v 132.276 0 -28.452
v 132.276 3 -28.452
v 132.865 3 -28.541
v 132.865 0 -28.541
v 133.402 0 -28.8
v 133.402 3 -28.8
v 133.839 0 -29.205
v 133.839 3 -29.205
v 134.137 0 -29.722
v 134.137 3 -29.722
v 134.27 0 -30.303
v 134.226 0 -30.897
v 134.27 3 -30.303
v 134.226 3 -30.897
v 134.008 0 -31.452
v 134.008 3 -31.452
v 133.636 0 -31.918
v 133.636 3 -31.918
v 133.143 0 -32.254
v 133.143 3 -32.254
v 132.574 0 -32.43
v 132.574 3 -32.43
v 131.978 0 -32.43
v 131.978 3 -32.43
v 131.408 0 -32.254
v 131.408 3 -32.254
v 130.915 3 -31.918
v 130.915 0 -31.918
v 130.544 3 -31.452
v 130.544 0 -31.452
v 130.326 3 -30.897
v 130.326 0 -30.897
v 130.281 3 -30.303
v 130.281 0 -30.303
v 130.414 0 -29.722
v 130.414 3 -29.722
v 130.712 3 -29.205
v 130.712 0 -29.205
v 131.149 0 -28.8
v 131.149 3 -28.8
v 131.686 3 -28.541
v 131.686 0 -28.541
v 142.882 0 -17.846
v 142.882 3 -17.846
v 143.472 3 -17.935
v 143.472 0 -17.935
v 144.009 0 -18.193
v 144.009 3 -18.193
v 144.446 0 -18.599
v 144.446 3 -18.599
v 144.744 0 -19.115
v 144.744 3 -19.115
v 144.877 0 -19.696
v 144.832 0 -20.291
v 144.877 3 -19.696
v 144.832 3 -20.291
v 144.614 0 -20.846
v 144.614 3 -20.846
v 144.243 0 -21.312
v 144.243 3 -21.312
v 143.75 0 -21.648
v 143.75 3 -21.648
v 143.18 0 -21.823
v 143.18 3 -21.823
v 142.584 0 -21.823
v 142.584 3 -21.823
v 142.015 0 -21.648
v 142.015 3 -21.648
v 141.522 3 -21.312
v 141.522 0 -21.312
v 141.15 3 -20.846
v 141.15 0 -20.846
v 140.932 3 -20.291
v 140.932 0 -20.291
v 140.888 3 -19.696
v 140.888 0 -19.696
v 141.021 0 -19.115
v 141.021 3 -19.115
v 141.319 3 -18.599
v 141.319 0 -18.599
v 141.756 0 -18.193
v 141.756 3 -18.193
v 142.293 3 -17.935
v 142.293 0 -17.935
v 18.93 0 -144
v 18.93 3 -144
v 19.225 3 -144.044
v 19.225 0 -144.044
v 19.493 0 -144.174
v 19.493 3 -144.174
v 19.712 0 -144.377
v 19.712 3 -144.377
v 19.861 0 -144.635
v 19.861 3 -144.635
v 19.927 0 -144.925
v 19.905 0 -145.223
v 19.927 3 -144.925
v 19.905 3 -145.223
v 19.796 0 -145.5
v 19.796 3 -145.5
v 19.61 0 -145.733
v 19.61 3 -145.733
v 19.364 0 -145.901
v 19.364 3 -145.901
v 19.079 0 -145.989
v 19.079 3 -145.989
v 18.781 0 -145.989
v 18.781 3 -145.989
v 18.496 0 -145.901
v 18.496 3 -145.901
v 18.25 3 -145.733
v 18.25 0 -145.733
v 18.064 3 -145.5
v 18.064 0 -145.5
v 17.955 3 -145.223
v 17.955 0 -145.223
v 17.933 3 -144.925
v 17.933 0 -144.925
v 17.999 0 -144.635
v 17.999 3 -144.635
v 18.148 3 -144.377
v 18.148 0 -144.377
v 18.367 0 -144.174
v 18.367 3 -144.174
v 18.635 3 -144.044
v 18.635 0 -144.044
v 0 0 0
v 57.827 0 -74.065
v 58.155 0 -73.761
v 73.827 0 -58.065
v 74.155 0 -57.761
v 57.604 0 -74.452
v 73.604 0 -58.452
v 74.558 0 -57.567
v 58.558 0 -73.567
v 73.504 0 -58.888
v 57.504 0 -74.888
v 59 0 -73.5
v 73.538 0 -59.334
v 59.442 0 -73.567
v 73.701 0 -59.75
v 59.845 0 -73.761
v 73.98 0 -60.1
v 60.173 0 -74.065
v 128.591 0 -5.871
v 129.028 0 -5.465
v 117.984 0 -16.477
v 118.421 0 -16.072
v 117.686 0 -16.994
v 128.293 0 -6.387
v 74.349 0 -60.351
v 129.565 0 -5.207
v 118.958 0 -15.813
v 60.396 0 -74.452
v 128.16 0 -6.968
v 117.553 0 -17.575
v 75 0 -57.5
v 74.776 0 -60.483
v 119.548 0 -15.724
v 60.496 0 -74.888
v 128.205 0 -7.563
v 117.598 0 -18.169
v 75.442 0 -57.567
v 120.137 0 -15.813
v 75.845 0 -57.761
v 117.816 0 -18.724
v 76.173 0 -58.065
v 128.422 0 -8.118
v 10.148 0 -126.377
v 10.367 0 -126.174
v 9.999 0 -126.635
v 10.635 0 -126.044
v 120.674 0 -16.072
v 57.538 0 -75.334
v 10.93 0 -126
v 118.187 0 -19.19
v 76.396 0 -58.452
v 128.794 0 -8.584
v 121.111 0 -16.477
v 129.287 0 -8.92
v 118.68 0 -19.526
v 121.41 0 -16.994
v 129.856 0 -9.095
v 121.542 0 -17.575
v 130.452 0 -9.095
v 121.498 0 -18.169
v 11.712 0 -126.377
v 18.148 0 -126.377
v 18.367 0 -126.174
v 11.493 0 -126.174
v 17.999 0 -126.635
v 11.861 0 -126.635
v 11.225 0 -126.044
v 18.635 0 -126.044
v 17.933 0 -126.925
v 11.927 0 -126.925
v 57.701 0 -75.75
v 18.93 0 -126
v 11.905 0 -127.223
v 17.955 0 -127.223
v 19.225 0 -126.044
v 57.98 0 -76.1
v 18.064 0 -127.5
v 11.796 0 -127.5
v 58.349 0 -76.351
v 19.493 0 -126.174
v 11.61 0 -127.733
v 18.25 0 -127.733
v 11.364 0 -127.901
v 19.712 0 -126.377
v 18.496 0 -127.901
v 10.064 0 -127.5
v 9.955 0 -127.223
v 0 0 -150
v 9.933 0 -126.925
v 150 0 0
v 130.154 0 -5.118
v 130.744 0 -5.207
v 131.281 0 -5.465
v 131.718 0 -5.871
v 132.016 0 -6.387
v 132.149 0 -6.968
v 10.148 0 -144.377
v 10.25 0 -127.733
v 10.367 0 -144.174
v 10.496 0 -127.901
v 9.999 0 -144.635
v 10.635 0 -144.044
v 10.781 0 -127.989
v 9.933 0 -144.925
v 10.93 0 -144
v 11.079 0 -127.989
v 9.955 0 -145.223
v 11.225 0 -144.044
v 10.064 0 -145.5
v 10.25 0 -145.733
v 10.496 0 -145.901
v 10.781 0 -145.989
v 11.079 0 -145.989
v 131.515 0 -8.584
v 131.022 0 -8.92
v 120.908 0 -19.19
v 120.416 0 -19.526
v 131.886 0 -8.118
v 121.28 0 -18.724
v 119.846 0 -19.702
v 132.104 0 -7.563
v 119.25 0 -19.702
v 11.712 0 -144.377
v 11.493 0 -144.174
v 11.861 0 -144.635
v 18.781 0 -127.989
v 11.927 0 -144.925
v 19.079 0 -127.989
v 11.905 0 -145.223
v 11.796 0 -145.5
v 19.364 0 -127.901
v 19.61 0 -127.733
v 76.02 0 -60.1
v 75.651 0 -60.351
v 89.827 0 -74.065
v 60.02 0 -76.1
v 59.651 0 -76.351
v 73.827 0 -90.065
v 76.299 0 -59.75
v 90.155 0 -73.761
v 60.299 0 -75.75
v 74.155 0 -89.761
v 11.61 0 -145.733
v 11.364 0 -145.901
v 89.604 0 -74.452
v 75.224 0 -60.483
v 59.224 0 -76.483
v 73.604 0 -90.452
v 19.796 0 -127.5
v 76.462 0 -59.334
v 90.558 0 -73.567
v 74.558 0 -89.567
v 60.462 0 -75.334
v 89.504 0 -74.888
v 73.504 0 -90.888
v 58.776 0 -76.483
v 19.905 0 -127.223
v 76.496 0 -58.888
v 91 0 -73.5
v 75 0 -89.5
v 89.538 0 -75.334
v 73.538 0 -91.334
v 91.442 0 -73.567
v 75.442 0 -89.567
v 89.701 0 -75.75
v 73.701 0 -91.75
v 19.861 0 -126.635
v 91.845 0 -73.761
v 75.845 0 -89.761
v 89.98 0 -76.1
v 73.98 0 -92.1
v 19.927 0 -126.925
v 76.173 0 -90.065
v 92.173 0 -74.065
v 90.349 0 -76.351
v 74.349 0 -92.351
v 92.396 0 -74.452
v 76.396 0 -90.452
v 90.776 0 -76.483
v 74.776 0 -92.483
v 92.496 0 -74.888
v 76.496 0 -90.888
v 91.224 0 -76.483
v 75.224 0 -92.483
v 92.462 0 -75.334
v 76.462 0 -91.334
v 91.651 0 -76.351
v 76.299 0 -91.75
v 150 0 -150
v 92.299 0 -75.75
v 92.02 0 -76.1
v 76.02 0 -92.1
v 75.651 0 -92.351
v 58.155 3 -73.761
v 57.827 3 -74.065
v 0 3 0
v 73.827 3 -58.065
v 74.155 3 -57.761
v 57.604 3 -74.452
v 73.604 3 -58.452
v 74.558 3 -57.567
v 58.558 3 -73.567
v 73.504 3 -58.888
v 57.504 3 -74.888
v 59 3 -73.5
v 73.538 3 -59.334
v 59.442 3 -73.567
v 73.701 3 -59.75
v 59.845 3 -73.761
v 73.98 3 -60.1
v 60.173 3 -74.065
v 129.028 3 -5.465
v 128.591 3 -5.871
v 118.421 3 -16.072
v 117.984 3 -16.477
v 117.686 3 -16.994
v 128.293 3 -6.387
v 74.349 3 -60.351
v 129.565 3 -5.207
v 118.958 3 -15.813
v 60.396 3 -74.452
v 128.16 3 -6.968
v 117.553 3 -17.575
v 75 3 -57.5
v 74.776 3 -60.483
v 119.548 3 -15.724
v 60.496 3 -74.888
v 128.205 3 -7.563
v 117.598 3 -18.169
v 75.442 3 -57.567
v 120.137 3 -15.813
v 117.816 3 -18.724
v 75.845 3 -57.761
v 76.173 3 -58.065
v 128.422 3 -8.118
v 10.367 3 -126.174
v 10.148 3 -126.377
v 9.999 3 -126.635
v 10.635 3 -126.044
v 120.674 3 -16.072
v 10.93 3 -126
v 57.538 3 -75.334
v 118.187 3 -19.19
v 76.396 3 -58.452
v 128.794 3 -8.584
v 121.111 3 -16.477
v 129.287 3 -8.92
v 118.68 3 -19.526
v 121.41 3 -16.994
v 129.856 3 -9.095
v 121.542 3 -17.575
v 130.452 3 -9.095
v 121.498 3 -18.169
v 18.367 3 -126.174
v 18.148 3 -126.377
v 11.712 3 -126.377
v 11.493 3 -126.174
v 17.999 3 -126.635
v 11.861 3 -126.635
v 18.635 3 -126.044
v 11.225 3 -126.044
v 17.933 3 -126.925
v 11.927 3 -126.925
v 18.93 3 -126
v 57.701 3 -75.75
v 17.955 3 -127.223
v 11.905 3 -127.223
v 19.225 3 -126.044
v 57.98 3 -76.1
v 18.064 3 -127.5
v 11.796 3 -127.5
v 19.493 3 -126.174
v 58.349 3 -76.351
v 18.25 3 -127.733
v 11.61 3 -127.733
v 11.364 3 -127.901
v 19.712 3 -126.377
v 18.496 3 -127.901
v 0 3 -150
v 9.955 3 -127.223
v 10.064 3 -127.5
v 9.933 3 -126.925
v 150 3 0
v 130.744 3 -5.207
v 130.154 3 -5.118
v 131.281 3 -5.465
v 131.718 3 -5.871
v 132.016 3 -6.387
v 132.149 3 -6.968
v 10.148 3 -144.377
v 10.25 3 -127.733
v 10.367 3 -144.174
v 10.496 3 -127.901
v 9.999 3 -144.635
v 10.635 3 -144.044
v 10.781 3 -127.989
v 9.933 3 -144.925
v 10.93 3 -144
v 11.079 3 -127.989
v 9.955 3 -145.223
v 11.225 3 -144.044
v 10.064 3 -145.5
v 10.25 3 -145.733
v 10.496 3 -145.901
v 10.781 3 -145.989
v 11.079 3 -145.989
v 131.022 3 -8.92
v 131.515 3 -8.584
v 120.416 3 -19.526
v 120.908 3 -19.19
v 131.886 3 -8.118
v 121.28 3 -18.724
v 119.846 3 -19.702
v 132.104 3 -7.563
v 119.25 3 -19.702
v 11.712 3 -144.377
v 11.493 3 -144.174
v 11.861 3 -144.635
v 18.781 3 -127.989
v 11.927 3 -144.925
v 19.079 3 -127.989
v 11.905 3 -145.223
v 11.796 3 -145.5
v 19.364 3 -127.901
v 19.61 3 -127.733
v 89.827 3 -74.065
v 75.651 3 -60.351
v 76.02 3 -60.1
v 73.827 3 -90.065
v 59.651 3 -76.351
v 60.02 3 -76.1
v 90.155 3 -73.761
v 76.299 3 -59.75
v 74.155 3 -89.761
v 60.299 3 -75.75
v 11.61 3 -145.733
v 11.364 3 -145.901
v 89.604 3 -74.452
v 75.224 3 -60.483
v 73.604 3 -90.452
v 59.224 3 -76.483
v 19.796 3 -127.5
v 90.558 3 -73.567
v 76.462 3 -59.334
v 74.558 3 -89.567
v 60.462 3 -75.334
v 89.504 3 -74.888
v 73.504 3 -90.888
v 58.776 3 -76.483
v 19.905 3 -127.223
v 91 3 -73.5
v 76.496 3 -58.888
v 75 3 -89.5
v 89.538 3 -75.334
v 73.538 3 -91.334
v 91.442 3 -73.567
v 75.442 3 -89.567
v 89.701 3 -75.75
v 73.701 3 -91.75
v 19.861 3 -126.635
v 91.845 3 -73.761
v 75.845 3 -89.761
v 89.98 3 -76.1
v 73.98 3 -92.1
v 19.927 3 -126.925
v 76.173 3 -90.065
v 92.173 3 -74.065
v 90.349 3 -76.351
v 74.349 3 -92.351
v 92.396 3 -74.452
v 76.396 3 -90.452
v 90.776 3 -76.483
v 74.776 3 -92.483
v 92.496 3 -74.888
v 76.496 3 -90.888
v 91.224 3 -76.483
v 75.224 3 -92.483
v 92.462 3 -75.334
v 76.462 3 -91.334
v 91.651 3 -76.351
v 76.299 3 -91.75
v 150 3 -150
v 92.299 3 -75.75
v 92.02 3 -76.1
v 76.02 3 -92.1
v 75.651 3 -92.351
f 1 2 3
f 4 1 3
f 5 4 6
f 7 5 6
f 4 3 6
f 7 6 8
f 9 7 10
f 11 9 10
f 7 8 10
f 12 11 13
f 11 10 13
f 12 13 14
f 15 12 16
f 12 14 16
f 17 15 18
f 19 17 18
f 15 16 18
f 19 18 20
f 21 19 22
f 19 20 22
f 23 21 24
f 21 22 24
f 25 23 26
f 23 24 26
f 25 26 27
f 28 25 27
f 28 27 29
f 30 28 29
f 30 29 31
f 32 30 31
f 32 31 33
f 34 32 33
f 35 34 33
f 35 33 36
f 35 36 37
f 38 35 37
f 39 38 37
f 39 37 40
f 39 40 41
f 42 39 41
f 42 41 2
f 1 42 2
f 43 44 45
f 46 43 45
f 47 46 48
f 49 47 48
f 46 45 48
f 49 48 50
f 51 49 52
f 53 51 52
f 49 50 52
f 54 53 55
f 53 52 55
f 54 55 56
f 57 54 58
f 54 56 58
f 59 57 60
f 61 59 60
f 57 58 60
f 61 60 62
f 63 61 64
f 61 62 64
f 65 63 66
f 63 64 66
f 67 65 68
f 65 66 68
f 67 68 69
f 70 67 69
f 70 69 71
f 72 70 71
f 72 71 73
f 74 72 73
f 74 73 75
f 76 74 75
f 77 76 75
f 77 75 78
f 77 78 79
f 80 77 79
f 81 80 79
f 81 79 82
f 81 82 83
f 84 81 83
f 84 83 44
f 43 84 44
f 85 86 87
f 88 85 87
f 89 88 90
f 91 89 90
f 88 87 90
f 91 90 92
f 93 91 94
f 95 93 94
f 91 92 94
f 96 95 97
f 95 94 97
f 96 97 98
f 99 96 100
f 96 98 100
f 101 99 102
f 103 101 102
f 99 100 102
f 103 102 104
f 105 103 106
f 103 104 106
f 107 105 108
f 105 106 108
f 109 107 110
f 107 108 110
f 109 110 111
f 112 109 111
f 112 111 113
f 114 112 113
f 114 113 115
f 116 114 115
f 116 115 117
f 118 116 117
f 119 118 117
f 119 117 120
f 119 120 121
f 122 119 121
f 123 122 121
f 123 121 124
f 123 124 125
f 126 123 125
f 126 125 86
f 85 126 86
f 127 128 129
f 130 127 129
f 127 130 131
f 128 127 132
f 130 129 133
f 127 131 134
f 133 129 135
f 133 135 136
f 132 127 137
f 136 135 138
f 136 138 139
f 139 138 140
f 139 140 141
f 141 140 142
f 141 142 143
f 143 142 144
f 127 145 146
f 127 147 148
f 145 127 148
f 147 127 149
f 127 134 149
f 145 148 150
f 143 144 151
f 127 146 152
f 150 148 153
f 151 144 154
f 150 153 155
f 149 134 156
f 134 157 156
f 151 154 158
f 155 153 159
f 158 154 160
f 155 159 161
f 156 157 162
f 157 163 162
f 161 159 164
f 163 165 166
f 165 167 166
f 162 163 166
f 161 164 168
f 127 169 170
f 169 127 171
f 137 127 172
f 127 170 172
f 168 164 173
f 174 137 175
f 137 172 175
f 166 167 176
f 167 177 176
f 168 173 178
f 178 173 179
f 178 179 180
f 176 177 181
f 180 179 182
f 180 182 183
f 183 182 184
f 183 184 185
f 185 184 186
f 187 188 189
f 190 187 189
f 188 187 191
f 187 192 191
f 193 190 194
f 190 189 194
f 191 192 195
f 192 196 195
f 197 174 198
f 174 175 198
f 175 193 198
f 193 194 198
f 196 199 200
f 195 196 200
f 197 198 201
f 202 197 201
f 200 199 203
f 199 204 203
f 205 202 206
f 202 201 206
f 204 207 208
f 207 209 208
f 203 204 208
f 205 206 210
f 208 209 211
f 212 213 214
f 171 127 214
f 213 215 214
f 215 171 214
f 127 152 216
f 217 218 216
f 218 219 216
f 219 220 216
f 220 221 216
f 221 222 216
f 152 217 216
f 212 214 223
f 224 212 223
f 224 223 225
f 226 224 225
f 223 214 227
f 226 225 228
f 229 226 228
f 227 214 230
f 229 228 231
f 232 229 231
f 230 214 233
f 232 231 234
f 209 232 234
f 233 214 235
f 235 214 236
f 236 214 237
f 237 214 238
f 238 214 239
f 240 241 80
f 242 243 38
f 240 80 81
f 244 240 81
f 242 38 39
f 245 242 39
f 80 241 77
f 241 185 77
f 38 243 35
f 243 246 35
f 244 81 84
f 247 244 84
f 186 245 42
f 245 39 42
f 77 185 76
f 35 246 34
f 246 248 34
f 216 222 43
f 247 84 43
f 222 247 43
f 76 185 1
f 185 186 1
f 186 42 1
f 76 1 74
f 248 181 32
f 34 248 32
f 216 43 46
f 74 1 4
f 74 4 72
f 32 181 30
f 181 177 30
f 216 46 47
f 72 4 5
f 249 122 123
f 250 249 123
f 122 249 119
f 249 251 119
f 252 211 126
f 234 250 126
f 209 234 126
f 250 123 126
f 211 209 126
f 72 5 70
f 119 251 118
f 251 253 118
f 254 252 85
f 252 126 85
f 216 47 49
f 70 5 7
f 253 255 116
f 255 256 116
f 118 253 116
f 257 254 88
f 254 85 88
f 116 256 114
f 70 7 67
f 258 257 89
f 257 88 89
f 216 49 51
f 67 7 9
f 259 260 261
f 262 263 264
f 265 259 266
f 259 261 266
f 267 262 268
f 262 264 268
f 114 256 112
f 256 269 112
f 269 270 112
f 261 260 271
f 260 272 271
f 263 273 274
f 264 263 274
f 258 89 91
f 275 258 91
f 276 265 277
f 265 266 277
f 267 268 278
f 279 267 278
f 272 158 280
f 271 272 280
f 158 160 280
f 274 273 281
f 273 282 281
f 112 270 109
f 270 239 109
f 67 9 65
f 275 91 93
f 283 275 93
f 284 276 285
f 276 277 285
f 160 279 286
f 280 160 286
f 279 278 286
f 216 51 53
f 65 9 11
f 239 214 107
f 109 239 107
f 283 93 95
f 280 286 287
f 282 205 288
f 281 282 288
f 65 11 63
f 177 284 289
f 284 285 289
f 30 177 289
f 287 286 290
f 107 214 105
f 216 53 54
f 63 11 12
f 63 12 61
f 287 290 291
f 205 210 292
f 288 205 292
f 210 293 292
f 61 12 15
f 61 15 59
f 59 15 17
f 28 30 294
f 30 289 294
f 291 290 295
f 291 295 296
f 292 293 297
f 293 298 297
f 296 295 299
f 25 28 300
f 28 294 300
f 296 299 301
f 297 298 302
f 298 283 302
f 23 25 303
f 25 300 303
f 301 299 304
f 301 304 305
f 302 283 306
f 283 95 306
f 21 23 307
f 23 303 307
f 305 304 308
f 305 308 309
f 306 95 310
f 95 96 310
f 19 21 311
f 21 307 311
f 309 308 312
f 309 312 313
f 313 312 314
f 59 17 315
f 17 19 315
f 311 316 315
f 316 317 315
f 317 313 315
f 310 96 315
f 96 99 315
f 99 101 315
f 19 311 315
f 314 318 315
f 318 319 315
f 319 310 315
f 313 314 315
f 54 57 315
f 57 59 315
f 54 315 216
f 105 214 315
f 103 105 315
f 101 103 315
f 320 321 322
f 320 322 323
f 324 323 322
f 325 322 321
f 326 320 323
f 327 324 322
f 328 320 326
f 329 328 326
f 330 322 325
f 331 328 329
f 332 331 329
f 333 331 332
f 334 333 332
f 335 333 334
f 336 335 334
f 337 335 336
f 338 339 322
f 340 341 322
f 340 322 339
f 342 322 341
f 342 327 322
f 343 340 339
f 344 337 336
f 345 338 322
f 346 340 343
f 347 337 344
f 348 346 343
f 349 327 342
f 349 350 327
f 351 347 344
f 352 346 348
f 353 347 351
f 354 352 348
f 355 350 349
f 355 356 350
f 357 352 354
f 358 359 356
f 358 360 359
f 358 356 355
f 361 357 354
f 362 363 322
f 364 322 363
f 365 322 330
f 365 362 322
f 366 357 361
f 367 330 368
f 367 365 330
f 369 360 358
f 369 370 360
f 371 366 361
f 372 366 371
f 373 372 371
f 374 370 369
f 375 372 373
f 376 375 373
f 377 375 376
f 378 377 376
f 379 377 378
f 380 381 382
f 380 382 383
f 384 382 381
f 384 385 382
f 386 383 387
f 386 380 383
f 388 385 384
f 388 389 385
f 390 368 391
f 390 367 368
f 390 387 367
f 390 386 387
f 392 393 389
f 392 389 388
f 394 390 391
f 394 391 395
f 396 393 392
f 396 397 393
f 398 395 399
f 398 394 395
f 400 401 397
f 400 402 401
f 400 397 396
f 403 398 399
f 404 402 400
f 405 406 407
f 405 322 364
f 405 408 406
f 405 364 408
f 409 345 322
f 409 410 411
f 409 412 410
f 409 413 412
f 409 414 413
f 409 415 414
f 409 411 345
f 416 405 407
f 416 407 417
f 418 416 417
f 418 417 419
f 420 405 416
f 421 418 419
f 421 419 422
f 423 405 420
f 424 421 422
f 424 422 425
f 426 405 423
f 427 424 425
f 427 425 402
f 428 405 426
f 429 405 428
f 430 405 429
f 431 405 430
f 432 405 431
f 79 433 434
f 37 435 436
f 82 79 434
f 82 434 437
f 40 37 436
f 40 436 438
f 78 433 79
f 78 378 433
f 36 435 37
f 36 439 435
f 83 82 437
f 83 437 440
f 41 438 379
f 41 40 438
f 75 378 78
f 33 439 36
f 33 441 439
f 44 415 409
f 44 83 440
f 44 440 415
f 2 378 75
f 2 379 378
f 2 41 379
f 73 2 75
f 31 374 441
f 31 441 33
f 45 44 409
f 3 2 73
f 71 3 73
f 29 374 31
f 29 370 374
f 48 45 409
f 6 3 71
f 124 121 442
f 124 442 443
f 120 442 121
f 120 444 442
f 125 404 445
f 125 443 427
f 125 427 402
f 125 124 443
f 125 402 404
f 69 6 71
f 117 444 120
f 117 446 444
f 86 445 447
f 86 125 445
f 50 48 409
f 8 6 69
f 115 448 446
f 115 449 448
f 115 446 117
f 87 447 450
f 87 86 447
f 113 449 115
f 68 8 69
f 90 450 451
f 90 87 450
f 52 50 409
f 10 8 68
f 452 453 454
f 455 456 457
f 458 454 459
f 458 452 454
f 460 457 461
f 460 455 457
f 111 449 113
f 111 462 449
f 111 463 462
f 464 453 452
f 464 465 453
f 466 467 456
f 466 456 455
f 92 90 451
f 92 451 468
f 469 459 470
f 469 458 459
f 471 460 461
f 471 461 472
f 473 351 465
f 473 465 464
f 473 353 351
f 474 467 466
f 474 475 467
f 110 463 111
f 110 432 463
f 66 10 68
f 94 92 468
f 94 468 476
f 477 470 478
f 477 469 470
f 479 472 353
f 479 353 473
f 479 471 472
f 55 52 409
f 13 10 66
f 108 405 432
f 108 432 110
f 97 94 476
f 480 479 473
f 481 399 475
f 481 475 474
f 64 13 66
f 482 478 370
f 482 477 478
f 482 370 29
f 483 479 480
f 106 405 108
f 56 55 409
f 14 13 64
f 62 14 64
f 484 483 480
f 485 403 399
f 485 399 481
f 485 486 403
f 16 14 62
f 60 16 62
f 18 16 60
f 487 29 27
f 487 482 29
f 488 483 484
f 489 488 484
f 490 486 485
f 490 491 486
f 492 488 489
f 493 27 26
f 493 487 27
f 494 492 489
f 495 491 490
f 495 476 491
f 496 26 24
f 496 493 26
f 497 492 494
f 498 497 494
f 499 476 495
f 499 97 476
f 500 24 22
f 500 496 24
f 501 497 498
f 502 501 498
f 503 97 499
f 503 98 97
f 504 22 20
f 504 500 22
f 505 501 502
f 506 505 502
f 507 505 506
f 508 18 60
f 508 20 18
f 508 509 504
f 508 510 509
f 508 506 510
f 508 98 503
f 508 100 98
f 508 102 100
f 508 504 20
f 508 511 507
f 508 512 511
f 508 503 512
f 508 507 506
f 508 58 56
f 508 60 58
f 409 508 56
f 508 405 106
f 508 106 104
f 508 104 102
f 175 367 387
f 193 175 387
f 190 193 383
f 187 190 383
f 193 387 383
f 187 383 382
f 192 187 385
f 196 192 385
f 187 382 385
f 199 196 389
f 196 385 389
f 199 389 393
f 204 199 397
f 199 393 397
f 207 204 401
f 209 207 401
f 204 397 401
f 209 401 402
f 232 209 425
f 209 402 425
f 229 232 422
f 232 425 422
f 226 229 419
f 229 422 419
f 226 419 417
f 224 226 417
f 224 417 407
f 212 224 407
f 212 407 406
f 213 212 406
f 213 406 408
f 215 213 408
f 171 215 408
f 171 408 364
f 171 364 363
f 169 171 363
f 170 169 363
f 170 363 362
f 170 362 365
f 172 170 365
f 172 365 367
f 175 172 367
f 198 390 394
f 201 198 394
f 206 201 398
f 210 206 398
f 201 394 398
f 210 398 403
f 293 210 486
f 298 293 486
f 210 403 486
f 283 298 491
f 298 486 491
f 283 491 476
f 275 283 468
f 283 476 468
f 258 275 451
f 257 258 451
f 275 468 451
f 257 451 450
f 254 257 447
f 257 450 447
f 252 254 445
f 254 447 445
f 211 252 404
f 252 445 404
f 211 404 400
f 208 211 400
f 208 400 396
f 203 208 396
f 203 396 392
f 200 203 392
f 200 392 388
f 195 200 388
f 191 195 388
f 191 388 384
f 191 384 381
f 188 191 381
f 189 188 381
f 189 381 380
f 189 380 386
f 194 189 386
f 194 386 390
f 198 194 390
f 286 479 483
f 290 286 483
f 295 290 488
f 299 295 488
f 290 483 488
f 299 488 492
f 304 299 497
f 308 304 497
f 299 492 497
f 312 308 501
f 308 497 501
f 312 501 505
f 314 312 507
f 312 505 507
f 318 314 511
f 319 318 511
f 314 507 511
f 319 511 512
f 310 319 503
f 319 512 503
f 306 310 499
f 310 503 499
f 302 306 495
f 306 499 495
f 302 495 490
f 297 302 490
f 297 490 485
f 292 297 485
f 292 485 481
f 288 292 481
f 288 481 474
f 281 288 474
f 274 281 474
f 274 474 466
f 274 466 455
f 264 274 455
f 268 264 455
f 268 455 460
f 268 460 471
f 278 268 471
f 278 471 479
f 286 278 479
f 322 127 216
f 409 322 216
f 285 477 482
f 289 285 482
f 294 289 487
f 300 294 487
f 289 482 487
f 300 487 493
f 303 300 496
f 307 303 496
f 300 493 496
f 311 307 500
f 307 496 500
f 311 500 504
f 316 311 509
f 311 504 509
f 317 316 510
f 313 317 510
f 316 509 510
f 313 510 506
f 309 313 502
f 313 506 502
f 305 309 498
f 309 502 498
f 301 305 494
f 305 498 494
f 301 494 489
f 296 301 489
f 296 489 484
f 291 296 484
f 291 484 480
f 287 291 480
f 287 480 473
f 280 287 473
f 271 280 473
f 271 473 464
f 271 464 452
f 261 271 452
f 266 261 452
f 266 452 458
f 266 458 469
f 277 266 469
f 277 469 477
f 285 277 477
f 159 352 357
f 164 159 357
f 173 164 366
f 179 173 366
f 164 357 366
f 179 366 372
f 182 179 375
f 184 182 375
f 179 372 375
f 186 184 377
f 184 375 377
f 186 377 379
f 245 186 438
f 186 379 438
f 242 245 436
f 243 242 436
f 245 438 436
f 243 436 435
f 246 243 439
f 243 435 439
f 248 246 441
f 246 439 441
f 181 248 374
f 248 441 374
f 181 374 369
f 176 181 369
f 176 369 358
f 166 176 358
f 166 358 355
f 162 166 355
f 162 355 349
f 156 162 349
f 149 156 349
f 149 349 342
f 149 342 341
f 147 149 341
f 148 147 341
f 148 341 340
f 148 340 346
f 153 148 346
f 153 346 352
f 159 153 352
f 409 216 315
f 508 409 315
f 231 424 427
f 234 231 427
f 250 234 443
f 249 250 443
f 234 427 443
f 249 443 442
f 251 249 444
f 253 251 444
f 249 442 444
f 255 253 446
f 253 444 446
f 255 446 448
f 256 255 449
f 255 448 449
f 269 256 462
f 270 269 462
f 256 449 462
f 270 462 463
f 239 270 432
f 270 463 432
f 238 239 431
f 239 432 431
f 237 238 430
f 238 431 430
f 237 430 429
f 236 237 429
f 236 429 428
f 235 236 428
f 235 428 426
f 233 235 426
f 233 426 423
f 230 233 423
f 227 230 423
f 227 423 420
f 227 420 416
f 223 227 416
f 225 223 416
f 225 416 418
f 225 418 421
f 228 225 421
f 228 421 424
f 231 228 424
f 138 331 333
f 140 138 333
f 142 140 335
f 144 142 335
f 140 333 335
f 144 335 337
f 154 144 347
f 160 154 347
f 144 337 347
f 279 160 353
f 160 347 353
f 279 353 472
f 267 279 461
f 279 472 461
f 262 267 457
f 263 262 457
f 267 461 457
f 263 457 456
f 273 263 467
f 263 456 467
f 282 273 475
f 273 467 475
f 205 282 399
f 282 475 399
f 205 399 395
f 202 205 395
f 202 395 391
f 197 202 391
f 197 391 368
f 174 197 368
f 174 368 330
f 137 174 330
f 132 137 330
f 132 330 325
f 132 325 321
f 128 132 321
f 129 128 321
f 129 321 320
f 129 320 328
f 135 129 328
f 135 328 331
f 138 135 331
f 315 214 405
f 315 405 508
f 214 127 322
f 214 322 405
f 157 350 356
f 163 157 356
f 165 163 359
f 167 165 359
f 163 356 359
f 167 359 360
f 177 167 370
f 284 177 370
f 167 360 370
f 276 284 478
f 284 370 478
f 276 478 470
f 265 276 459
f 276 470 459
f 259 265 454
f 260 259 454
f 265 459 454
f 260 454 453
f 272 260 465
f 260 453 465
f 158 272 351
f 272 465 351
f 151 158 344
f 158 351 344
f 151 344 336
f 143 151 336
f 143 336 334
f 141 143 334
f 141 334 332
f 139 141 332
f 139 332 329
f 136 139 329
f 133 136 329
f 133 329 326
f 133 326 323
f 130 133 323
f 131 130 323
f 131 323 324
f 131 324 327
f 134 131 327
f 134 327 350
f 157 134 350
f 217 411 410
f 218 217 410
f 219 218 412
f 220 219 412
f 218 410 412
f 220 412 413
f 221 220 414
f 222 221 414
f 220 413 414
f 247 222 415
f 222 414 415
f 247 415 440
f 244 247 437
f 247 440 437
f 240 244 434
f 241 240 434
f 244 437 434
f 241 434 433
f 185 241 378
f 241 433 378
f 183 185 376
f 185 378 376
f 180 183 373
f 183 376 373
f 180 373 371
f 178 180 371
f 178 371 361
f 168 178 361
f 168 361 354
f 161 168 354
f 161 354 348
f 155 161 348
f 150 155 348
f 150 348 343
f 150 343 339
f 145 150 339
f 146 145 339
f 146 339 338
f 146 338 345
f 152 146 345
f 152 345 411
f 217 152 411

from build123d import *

# Parameters (mm, degrees)
SKETCH1_W           = 150
SKETCH1_H           = 150
BOSS_EXTRUDE1_DEPTH = 3
SKETCH2_R           = 1.5
SKETCH2_R_2         = 1
CUT_EXTRUDE1_DEPTH  = 10
SKETCH5_R           = 2
CUT_EXTRUDE2_DEPTH  = 10


with BuildPart() as part:
    # Sketch1 → Boss-Extrude1 (new body)
    with BuildSketch(Plane(origin=(0, 0, 0), x_dir=(1, 0, 0), z_dir=(0, 1, 0))):
        with Locations((75, 75)):
            Rectangle(SKETCH1_W, SKETCH1_H)
    extrude(amount=BOSS_EXTRUDE1_DEPTH)

    # Sketch2 → Cut-Extrude1 (cut)
    with BuildSketch(Plane(origin=(0, 3, 0), x_dir=(1, 0, 0), z_dir=(0, 1, 0))):
        with Locations(Location((75, 59, 0), (0, 0, 270))):
            Circle(SKETCH2_R)
        with Locations(Location((59, 75, 0), (0, 0, 270))):
            Circle(SKETCH2_R)
        with Locations(Location((75, 91, 0), (0, 0, 270))):
            Circle(SKETCH2_R)
        with Locations(Location((91, 75, 0), (0, 0, 270))):
            Circle(SKETCH2_R)
        with Locations(Location((18.93, 145, 0), (0, 0, 270))):
            Circle(SKETCH2_R_2)
        with Locations(Location((10.93, 145, 0), (0, 0, 270))):
            Circle(SKETCH2_R_2)
        with Locations(Location((18.93, 127, 0), (0, 0, 270))):
            Circle(SKETCH2_R_2)
        with Locations(Location((10.93, 127, 0), (0, 0, 270))):
            Circle(SKETCH2_R_2)
    extrude(amount=-CUT_EXTRUDE1_DEPTH, mode=Mode.SUBTRACT)

    # Sketch5 → Cut-Extrude2 (cut)
    with BuildSketch(Plane(origin=(0, 3, 0), x_dir=(1, 0, 0), z_dir=(0, 1, 0))):
        with Locations(Location((132.275691154, 30.452272789, 0), (0, 0, 270))):
            Circle(SKETCH5_R)
        with Locations(Location((119.547769092, 17.724350728, 0), (0, 0, 270))):
            Circle(SKETCH5_R)
        with Locations(Location((130.15437081, 7.11774901, 0), (0, 0, 270))):
            Circle(SKETCH5_R)
        with Locations(Location((142.882292871, 19.845671071, 0), (0, 0, 270))):
            Circle(SKETCH5_R)
    extrude(amount=-CUT_EXTRUDE2_DEPTH, mode=Mode.SUBTRACT)


solid = part.part
